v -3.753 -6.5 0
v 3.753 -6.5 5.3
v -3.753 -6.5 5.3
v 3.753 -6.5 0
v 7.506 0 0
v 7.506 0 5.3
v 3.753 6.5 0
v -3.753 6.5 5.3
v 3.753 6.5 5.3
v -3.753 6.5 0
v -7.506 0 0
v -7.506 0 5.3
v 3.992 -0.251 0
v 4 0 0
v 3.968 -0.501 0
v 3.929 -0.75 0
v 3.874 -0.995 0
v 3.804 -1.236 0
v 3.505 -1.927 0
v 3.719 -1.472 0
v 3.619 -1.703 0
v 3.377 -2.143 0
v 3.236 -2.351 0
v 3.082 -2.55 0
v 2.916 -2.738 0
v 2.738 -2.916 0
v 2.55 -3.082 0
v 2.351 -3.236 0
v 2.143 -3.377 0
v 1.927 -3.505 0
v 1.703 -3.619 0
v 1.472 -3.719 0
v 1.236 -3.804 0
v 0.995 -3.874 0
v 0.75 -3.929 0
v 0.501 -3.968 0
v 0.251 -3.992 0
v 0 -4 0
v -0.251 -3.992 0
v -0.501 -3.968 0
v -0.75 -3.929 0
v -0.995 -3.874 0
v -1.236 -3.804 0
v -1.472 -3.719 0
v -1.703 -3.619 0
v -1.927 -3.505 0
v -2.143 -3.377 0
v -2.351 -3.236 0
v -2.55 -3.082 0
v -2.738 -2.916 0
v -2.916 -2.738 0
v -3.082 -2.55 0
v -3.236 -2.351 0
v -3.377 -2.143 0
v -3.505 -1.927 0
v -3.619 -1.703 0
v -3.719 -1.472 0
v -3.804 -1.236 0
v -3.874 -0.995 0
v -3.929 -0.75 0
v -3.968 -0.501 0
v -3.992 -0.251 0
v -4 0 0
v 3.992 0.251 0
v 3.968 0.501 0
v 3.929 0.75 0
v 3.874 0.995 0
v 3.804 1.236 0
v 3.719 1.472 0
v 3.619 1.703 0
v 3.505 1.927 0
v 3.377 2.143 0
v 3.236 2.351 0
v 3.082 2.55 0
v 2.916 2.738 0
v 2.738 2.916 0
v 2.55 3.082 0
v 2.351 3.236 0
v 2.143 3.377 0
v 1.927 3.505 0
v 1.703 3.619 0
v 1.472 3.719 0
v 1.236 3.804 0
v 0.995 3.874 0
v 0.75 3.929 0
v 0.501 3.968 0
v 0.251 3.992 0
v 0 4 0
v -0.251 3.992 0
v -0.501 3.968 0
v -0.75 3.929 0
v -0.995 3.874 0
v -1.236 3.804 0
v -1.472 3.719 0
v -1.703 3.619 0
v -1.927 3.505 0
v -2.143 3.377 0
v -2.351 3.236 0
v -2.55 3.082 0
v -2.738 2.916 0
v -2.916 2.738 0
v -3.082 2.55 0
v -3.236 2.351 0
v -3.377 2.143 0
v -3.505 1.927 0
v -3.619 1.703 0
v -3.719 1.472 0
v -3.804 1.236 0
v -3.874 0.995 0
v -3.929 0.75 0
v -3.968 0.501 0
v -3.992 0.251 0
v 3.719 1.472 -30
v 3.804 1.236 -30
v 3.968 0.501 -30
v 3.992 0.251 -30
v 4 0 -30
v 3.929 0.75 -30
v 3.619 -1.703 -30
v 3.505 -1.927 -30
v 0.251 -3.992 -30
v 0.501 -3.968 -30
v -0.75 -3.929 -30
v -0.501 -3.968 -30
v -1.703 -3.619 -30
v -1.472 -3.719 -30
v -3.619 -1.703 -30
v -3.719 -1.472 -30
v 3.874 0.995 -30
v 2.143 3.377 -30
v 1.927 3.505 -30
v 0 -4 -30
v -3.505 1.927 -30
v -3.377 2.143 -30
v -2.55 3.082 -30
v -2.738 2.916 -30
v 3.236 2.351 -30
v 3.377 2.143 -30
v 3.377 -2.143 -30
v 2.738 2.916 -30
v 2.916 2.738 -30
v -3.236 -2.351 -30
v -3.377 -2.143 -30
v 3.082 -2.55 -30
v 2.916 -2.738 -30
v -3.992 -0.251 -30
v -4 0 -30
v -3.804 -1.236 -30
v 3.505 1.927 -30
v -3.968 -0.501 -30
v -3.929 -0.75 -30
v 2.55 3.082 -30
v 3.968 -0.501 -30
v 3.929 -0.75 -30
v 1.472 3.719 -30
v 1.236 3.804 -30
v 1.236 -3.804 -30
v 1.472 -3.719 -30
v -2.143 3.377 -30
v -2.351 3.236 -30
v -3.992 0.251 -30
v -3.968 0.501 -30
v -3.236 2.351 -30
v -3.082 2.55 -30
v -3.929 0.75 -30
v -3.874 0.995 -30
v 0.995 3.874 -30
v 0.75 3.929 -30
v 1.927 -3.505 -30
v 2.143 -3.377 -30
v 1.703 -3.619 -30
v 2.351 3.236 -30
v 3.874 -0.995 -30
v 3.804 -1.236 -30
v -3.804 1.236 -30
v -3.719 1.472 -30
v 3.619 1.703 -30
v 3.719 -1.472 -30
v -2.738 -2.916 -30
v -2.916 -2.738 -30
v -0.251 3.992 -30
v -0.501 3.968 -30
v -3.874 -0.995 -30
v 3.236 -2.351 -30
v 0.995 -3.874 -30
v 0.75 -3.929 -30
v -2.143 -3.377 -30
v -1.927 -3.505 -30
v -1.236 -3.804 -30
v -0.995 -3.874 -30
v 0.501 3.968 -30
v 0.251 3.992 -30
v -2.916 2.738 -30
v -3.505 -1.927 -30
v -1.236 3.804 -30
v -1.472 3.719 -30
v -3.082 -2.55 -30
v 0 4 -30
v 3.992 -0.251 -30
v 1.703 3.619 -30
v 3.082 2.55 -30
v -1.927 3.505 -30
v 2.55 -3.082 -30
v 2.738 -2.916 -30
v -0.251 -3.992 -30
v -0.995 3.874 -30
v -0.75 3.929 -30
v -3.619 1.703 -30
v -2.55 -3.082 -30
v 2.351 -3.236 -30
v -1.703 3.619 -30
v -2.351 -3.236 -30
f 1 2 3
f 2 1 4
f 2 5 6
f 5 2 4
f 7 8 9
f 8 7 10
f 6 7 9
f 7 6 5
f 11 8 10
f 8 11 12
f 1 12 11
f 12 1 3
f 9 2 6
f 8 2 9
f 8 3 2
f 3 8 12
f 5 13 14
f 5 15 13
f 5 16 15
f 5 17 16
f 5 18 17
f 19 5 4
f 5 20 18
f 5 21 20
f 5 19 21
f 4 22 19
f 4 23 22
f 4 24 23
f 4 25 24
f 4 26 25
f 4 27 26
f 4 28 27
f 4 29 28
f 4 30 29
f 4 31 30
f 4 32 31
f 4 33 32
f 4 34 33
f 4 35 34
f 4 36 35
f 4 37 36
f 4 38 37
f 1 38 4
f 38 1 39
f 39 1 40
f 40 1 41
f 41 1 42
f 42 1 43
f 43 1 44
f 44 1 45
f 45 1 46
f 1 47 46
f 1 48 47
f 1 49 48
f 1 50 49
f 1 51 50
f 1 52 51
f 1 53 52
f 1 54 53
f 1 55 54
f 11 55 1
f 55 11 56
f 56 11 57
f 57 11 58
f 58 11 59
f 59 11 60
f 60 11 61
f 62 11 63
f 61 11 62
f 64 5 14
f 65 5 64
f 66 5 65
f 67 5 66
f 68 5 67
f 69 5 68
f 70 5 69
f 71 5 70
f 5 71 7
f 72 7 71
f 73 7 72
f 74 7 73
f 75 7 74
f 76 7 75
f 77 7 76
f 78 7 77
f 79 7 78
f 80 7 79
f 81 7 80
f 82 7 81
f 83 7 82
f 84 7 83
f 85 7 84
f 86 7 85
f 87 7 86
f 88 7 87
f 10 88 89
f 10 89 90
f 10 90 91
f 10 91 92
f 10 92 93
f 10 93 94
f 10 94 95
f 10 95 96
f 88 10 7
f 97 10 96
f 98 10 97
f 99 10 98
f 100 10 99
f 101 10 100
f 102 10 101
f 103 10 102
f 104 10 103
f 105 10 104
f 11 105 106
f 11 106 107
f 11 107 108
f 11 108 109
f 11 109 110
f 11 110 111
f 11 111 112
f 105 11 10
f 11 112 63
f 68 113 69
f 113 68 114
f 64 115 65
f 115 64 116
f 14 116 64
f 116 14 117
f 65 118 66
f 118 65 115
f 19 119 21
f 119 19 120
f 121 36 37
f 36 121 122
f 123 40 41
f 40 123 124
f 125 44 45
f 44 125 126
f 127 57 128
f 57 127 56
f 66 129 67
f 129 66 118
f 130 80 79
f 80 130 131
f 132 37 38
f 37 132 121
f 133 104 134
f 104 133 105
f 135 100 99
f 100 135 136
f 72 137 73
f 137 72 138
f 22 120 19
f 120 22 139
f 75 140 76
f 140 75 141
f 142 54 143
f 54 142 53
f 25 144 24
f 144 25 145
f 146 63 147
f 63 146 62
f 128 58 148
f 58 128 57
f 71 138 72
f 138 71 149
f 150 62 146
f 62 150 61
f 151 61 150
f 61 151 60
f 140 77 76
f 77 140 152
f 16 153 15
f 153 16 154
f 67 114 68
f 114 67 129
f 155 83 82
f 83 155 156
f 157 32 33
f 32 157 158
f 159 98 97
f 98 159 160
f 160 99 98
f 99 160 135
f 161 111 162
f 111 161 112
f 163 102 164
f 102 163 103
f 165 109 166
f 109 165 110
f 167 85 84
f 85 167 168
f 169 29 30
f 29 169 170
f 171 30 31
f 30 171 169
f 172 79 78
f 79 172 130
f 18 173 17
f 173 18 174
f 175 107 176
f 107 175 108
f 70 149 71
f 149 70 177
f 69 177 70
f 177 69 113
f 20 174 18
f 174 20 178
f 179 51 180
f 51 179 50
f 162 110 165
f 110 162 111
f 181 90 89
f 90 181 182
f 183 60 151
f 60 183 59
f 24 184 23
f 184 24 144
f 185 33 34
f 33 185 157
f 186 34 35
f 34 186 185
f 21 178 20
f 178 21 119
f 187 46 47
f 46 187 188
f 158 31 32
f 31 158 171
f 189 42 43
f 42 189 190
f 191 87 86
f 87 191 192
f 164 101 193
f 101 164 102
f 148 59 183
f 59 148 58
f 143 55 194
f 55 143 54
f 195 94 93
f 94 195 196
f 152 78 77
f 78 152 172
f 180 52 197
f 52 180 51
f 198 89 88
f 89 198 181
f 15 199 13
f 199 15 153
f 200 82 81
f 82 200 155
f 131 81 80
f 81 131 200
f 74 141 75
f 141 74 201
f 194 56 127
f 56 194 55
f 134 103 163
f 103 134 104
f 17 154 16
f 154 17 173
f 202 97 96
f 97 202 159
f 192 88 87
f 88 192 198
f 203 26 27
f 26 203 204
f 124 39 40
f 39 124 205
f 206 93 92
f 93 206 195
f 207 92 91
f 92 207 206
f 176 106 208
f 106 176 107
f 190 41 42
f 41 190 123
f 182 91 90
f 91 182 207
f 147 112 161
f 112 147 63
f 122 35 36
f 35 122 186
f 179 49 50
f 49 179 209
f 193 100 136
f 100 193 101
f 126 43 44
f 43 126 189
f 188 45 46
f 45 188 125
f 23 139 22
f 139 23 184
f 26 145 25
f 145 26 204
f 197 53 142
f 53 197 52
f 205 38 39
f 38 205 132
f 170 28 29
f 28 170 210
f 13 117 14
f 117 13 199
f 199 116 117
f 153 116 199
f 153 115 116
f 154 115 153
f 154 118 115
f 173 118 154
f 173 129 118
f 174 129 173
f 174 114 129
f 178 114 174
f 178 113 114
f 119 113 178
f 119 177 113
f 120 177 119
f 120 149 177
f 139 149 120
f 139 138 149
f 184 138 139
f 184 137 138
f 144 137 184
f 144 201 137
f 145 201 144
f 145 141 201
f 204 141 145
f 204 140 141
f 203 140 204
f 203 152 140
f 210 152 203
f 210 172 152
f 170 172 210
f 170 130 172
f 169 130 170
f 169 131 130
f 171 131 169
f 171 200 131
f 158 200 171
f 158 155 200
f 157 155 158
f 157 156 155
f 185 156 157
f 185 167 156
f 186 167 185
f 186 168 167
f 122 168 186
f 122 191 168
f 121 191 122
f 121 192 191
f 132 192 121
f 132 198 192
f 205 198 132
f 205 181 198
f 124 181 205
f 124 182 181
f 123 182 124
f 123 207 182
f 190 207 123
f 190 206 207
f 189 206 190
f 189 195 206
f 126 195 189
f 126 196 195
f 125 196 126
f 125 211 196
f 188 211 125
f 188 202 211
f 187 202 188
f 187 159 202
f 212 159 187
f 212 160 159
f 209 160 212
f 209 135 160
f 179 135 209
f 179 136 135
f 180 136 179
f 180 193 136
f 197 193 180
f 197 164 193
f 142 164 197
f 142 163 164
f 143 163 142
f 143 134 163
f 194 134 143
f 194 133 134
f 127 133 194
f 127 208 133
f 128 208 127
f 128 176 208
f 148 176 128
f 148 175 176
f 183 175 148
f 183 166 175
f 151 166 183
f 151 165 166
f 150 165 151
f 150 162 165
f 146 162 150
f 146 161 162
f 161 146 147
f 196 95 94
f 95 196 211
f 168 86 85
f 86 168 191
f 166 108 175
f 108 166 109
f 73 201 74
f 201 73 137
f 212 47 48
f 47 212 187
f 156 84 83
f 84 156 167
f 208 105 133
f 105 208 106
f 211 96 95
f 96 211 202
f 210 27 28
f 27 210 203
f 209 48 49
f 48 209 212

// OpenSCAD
// M8 六角ボルト（規格準拠、ねじ山省略）

$fn = 100;

// 頭部寸法
head_af = 13;      // 対辺距離 (across-flats)
head_h  = 5.3;     // 頭部高さ

// シャンク寸法
shank_d = 8;       // シャンク直径
shank_l = 30;      // シャンク長さ

// 六角柱を作るための外接円直径
// across-flats = across-corners * cos(30°)
head_diameter = head_af / cos(30);

module hex_bolt() {
    // 頭部：底面が z=0、上方向(+Z)に高さ head_h
    translate([0, 0, 0])
        cylinder(h = head_h, d = head_diameter, $fn = 6);

    // シャンク：z=0 から -shank_l 方向へ伸ばす
    translate([0, 0, -shank_l])
        cylinder(h = shank_l, d = shank_d, $fn = 100);
}

hex_bolt();
